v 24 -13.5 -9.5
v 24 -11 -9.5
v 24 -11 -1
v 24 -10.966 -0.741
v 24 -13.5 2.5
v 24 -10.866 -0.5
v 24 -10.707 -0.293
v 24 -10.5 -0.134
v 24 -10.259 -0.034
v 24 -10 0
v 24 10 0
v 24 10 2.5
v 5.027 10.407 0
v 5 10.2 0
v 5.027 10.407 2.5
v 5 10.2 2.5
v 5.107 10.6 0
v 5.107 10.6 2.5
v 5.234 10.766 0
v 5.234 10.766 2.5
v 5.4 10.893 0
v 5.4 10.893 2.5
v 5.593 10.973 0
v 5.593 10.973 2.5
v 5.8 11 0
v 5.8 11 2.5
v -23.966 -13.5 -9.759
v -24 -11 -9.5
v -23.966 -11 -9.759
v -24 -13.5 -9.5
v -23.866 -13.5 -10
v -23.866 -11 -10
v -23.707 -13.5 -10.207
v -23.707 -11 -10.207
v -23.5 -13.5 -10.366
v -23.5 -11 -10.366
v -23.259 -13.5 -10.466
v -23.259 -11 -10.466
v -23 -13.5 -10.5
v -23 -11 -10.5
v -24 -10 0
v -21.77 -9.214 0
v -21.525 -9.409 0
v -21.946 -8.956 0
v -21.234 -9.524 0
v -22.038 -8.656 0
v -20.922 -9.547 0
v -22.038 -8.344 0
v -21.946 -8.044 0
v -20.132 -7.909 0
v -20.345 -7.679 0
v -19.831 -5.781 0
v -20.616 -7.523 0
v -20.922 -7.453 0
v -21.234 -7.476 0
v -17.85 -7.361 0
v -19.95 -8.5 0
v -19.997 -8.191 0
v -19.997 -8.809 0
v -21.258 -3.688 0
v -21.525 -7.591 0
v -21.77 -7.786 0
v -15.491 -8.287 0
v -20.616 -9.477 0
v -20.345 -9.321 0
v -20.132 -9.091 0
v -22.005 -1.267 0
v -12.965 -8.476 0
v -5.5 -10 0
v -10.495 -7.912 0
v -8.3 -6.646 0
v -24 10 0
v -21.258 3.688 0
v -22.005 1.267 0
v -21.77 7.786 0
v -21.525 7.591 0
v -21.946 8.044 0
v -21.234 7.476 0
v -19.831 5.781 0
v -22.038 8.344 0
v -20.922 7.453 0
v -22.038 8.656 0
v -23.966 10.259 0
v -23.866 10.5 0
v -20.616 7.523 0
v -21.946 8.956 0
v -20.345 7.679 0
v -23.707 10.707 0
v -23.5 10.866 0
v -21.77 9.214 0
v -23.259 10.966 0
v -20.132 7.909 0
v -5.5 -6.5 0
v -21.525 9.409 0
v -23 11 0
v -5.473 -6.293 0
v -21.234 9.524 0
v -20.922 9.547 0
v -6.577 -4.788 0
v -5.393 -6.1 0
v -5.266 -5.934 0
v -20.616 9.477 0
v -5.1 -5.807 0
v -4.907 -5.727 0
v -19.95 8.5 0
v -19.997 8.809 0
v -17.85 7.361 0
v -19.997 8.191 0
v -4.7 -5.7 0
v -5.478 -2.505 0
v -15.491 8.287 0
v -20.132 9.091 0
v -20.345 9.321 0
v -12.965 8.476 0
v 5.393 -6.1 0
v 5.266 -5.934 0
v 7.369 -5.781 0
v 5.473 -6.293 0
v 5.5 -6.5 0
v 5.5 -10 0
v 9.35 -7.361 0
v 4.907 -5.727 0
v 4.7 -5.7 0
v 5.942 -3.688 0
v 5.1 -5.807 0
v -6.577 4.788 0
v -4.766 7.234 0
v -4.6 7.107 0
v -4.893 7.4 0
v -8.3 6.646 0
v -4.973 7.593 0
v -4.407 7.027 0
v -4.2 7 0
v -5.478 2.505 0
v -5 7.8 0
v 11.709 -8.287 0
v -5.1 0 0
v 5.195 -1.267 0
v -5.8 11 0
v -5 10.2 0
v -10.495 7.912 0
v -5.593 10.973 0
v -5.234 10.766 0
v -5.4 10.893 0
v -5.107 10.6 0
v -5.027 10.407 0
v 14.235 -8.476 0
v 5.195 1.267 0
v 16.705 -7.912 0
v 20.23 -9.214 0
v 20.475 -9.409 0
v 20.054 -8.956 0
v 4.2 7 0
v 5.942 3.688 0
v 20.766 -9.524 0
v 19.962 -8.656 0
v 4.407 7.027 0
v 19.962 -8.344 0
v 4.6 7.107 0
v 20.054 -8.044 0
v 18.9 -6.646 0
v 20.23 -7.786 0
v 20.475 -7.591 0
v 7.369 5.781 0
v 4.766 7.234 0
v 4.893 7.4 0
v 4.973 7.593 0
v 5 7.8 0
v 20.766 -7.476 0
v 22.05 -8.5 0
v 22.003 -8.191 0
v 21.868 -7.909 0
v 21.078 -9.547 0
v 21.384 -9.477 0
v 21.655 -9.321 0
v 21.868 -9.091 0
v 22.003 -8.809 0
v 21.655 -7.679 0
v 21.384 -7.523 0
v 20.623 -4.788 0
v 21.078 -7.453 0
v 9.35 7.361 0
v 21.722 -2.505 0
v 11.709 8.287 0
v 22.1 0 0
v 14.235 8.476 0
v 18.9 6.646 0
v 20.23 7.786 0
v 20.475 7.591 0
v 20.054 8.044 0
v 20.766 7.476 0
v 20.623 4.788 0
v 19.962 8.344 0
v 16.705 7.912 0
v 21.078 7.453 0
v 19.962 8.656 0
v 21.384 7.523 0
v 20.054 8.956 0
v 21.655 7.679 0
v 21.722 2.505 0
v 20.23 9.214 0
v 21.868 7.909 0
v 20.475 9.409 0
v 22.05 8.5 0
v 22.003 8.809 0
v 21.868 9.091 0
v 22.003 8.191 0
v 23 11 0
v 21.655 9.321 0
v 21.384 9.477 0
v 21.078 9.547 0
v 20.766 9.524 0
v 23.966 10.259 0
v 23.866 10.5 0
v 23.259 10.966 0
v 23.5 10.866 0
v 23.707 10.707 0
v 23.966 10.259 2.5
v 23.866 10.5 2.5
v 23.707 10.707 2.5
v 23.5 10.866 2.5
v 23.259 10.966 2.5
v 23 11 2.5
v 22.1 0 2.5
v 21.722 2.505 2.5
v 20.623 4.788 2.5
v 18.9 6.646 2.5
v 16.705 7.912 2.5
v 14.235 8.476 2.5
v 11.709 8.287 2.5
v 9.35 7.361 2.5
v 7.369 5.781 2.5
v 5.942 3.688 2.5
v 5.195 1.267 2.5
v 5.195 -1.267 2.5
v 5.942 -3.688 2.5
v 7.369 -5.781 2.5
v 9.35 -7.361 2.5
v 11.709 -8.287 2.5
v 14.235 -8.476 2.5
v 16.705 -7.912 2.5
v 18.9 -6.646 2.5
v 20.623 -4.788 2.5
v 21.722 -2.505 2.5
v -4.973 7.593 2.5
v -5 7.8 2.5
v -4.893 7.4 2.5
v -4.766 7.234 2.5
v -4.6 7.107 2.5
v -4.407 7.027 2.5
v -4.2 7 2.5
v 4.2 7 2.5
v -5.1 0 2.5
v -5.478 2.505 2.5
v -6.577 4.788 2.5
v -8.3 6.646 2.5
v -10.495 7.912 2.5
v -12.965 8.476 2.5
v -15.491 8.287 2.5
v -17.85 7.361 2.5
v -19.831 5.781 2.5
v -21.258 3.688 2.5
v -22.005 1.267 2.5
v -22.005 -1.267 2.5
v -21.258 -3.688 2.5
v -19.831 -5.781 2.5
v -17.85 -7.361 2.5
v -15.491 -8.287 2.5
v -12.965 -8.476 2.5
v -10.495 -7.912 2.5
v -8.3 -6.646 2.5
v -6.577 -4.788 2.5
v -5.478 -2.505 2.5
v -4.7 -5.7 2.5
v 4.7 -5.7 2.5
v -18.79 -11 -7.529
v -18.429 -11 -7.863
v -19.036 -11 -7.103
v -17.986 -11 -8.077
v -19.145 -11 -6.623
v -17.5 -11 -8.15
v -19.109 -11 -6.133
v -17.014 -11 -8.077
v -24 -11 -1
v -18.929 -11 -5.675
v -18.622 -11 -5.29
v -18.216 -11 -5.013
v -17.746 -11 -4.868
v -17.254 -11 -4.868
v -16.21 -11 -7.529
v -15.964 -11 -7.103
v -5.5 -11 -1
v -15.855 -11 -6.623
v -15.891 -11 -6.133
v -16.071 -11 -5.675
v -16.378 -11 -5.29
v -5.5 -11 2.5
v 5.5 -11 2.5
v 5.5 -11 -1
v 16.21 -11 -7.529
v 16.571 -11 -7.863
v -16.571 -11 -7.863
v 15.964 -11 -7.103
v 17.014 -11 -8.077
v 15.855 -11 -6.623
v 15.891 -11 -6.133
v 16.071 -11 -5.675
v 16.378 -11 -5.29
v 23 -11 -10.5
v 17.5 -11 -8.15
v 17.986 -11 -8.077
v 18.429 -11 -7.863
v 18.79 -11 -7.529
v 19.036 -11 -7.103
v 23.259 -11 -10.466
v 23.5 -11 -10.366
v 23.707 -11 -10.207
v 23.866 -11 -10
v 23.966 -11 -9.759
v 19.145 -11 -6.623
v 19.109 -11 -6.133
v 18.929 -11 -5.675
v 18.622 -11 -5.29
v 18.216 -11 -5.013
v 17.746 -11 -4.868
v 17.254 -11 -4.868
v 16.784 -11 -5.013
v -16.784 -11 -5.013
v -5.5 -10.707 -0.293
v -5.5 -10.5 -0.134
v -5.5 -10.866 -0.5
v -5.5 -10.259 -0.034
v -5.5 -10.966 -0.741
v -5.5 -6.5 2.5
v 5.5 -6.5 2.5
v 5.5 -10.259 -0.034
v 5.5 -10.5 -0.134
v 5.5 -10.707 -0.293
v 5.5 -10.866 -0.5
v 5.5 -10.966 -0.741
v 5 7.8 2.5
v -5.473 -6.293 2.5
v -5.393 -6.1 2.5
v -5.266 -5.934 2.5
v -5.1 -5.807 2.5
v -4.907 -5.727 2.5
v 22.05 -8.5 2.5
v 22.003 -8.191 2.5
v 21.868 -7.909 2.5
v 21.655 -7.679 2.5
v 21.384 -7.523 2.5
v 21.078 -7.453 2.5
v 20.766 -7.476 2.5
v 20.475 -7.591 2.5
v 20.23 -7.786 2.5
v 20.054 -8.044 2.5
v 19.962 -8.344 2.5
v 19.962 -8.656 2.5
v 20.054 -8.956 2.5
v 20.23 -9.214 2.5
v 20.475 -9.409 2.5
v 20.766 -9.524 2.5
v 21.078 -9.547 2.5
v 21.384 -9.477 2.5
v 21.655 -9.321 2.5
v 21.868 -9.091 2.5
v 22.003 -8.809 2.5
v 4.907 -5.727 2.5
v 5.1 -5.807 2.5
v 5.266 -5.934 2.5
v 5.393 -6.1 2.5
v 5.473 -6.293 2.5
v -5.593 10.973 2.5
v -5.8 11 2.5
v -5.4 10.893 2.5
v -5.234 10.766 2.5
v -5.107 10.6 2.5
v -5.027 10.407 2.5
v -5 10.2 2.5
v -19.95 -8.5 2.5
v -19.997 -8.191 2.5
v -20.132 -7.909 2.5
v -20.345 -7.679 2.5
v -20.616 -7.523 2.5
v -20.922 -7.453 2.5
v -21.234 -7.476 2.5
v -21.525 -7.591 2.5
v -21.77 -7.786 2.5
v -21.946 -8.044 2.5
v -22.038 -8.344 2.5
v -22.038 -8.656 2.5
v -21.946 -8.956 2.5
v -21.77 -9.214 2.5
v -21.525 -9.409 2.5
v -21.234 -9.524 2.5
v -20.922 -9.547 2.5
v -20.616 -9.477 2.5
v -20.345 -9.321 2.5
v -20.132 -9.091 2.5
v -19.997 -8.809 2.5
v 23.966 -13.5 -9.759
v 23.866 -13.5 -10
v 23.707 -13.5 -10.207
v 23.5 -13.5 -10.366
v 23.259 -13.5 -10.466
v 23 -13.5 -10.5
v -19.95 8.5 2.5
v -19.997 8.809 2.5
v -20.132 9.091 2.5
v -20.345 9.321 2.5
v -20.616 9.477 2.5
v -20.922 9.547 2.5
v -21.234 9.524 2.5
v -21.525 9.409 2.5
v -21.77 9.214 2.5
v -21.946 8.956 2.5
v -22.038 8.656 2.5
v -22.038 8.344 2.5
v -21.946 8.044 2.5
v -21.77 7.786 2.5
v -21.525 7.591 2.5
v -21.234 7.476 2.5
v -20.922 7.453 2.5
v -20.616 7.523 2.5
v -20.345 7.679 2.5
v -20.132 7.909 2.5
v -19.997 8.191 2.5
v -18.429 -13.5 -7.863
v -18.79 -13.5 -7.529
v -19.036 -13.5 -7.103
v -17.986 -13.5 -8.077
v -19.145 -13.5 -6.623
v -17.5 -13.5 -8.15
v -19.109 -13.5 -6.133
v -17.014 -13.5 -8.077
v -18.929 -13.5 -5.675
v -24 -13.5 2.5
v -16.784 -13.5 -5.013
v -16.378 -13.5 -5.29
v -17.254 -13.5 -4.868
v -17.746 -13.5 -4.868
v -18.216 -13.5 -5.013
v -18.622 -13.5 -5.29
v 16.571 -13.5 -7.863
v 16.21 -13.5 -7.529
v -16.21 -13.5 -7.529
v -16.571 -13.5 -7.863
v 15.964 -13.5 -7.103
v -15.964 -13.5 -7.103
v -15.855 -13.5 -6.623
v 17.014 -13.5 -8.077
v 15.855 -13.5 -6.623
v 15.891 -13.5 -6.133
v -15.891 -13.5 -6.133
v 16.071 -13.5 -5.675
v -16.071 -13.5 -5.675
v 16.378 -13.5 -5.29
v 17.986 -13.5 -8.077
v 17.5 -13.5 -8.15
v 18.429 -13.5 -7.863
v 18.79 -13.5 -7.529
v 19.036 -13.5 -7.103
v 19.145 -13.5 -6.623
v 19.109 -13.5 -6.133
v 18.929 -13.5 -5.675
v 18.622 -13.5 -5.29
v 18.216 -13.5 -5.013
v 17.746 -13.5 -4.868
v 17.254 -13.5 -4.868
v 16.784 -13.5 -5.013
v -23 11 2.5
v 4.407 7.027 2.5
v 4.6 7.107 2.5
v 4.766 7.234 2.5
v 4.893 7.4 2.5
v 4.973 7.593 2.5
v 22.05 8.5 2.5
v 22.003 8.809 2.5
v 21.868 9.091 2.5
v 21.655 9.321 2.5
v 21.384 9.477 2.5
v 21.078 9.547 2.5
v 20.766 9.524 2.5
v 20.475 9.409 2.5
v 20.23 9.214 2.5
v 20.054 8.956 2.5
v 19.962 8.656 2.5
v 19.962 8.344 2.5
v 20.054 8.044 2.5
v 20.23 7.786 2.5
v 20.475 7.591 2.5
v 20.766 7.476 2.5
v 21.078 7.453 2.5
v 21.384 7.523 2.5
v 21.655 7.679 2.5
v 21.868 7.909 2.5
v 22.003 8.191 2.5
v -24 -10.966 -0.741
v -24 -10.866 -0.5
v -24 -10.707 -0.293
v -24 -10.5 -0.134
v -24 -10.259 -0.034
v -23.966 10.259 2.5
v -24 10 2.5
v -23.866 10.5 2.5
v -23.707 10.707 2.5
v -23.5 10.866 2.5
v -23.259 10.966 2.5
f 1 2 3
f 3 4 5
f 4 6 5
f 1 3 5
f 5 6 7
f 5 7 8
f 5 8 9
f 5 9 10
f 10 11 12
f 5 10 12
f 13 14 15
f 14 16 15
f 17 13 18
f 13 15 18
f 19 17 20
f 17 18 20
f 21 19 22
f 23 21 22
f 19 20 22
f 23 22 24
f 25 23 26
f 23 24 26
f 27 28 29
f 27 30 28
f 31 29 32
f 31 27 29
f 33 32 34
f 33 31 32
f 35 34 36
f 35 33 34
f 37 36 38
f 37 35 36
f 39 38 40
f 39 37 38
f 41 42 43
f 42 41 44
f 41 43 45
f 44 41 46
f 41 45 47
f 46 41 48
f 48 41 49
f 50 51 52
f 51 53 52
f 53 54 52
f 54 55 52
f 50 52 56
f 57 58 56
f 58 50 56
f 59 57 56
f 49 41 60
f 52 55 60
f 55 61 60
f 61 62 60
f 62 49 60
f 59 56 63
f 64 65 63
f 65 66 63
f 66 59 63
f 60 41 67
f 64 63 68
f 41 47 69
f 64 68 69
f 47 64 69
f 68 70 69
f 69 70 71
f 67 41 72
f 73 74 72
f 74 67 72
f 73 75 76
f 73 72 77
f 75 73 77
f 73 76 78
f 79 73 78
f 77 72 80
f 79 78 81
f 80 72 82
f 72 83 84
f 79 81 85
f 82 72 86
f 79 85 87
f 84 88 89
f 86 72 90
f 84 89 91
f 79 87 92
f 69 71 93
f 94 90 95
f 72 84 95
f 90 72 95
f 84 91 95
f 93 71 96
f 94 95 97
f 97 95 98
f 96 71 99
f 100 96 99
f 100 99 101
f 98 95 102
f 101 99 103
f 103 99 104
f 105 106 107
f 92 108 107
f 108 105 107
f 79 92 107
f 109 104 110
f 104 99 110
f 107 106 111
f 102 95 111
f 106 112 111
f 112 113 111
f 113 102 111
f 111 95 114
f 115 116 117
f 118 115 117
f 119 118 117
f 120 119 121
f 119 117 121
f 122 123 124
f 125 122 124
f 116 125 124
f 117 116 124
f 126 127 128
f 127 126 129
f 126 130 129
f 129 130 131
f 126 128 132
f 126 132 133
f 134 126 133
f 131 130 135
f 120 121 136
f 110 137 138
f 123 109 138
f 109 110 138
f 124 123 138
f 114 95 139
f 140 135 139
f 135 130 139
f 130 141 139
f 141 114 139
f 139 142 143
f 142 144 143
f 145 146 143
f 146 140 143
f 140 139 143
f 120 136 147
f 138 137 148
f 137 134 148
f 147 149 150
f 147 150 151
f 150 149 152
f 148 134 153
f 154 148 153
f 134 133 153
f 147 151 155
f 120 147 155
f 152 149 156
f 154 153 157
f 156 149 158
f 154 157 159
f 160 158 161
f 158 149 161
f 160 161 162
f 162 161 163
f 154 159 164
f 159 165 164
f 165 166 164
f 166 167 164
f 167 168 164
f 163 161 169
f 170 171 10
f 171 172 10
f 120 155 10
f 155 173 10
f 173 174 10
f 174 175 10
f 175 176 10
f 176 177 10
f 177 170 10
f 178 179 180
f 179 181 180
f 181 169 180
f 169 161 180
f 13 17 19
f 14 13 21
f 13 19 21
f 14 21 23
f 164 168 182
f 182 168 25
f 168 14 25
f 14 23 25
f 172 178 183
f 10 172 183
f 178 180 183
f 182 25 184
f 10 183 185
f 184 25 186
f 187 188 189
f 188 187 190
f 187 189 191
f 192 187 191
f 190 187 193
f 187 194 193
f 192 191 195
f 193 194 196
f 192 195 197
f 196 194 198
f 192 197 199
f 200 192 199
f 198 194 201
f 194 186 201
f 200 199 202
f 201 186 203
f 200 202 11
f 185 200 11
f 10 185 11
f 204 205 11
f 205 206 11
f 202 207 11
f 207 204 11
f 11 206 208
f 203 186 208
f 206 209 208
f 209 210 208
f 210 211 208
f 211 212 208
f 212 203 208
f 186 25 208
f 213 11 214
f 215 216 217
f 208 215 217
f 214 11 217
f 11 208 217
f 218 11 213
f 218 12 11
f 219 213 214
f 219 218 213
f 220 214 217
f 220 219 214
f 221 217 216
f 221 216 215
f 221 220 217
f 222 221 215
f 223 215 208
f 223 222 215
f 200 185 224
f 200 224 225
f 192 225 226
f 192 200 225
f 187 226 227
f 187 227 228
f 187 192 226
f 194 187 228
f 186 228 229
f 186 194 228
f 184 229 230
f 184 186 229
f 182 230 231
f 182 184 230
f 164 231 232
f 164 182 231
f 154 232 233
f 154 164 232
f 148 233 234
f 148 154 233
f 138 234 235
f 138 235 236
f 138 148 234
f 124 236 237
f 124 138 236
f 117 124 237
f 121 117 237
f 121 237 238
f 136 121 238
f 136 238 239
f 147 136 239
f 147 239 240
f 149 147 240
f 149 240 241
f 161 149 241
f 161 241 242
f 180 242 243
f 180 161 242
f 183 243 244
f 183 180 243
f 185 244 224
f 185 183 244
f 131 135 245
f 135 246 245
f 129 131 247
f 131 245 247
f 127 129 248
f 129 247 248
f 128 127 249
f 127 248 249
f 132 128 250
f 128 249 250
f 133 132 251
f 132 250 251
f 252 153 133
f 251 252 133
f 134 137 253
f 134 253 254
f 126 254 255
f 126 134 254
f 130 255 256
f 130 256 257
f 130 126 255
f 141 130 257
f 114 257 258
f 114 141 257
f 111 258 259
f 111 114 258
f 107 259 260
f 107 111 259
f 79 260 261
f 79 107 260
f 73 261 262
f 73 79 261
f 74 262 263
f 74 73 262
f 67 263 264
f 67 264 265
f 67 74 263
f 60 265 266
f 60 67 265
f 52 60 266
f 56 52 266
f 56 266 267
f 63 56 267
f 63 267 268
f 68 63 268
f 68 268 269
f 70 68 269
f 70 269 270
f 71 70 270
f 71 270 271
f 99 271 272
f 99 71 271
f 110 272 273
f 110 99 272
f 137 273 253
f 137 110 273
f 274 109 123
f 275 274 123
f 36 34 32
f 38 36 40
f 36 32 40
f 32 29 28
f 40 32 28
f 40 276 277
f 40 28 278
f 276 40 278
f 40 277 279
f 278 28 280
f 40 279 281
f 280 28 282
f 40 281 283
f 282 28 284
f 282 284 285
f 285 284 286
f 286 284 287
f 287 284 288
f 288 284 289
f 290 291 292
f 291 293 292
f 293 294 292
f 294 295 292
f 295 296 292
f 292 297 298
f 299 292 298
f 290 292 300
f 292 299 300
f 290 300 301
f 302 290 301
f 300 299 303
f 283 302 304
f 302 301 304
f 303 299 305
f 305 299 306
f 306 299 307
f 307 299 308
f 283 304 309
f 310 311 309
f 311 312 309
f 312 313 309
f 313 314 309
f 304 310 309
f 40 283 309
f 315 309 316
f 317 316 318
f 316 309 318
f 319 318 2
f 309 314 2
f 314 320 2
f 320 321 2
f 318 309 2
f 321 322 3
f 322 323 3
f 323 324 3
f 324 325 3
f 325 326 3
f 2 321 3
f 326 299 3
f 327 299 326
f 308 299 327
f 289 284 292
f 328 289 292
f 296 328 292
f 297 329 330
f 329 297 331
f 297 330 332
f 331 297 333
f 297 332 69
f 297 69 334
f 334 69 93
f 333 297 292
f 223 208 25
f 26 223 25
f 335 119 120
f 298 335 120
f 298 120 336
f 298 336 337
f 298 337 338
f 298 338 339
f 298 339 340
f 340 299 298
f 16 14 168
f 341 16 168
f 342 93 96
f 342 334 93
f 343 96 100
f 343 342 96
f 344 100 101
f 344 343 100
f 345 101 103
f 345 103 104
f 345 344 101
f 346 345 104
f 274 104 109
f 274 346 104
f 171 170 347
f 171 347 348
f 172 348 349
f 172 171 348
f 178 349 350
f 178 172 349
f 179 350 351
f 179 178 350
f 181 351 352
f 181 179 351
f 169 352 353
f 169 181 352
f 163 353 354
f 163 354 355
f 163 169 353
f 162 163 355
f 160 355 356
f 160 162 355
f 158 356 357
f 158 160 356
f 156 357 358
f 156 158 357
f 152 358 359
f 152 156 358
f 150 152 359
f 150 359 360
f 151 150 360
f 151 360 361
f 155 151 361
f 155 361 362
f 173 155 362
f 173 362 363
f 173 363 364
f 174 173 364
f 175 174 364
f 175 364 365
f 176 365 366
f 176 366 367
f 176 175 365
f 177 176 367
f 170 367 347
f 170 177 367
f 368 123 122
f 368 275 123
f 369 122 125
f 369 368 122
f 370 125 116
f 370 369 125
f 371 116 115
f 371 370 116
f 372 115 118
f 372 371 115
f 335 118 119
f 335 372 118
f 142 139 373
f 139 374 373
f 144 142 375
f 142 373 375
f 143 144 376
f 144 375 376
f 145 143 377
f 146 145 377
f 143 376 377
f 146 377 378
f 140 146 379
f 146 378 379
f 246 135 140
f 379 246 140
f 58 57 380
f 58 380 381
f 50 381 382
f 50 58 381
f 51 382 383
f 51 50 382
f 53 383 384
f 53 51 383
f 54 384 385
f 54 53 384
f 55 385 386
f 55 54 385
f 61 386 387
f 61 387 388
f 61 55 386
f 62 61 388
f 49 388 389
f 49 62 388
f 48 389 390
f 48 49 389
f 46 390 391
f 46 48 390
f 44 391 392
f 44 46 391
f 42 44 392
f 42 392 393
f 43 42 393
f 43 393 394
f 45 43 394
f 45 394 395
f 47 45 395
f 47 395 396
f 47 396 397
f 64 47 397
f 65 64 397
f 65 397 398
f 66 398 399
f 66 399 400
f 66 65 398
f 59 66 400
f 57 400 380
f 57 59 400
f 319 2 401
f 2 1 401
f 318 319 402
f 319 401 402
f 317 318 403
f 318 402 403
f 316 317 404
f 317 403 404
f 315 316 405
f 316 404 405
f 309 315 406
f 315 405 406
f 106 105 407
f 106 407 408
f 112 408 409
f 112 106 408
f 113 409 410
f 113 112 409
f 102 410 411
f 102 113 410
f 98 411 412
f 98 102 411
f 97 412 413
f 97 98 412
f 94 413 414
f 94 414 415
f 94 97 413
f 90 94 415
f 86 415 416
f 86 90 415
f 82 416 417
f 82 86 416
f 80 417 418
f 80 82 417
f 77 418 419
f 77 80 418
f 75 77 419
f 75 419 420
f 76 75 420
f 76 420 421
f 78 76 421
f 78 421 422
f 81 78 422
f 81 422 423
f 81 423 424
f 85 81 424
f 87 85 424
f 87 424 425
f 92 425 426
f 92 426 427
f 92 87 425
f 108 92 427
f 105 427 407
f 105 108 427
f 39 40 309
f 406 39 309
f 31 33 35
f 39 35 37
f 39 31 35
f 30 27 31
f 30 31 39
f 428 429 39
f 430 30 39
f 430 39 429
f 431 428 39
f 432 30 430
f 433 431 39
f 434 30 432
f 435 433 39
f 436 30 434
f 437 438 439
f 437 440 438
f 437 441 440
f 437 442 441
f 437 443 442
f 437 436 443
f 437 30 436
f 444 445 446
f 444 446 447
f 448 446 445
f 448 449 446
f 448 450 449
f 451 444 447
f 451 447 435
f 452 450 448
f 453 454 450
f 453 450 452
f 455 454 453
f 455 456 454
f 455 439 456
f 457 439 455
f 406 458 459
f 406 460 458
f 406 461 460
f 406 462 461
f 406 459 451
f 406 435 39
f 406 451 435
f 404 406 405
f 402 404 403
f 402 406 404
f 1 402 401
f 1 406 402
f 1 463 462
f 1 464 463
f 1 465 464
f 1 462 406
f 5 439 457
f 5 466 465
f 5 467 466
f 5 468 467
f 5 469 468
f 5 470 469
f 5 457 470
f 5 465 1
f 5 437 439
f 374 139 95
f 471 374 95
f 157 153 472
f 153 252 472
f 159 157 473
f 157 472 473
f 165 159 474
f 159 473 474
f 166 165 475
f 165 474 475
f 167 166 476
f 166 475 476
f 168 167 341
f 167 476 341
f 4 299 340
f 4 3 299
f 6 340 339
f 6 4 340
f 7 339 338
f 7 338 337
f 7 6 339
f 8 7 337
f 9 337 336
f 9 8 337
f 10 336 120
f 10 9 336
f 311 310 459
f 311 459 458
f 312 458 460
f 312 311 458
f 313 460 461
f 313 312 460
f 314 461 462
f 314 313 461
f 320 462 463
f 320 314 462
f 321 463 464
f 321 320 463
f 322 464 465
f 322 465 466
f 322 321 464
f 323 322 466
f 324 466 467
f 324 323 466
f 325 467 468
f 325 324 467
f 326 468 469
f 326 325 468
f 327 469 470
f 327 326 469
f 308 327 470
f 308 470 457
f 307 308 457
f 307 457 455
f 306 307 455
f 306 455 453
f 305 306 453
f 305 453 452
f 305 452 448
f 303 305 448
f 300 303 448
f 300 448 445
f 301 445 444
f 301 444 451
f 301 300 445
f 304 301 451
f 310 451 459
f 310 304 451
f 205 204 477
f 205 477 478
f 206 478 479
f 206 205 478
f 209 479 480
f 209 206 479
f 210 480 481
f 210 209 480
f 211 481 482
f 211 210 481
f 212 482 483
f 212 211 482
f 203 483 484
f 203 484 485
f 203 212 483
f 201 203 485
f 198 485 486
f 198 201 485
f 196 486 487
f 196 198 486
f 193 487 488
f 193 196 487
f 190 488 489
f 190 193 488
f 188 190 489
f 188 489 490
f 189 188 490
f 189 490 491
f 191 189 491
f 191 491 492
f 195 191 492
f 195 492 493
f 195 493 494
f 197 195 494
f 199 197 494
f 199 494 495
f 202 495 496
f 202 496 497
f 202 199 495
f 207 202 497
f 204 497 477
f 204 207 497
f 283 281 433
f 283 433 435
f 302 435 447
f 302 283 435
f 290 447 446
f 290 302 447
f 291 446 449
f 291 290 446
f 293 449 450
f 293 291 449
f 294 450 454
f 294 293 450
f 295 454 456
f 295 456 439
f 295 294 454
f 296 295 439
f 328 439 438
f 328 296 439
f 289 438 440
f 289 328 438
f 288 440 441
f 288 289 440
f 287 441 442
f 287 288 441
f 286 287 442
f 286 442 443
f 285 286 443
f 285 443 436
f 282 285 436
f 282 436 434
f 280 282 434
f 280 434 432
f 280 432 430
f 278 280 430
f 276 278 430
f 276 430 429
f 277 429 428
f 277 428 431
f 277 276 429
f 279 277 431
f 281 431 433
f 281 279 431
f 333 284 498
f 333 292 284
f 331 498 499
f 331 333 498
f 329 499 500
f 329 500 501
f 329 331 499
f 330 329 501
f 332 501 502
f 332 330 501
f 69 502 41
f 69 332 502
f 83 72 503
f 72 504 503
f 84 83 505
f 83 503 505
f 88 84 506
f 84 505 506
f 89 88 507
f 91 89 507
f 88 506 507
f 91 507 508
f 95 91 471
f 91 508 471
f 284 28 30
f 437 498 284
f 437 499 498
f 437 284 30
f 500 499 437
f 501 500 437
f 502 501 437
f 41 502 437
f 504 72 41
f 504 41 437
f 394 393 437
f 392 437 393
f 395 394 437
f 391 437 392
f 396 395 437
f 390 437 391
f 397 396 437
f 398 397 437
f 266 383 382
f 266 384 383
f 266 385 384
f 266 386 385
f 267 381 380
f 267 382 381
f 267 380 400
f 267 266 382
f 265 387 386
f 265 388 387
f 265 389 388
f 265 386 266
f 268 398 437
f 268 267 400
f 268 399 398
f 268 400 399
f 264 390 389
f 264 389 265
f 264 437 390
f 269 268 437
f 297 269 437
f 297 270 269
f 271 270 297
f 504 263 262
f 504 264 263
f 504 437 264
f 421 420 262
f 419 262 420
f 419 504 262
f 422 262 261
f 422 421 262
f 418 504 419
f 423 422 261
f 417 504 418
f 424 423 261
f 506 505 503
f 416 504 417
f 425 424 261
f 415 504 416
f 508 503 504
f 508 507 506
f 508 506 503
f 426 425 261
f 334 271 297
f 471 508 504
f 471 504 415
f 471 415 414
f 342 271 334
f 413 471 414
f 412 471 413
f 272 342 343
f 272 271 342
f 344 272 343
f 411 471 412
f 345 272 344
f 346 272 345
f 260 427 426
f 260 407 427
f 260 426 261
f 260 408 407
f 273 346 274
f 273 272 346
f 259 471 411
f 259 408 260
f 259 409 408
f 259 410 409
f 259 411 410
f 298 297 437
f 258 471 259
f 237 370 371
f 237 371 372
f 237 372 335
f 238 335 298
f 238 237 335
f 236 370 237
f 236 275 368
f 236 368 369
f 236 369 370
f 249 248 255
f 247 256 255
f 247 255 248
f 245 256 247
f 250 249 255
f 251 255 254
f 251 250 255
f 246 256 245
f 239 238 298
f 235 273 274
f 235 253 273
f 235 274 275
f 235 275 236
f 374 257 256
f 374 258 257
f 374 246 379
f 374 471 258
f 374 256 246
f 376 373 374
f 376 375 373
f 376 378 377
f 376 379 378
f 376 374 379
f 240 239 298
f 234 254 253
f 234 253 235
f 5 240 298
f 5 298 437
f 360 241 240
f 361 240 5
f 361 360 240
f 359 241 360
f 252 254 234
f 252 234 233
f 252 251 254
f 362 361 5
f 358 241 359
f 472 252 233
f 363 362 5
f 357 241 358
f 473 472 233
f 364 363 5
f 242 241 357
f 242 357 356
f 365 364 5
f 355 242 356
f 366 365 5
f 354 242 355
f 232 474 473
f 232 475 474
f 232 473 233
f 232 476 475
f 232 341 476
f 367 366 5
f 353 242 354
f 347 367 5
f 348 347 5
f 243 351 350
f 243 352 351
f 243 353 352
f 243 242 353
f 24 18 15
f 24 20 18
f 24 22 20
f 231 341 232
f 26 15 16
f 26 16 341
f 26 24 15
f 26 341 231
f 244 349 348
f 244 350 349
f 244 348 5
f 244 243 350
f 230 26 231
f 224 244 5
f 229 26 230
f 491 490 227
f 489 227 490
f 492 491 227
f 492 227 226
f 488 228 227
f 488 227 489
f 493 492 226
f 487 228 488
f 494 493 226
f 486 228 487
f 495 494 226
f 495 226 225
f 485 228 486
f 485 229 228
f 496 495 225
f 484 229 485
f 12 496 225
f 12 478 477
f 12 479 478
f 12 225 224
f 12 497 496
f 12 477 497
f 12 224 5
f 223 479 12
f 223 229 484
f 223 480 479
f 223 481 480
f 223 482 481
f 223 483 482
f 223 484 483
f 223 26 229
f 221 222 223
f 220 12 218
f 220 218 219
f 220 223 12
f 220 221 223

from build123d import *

# Parameters (mm, degrees)
SKETCH_1_R      = 1.05
SKETCH_1_R_2    = 8.5
EXTRUDE_1_DEPTH = 2.5
FILLET_1_R      = 0.8
SKETCH_2_W      = 48
SKETCH_2_H      = 13
SKETCH_2_R      = 1.65
EXTRUDE_2_DEPTH = 2.5
FILLET_2_R      = 1
FILLET_3_R      = 1


with BuildPart() as part:
    # 草图1 → 凸台-拉伸1 (new body)
    with BuildSketch(Plane.XY):
        Polygon((-24, 11), (-24, -11), (-5.5, -11), (-5.5, -5.7), (5.5, -5.7), (5.5, -11), (24, -11), (24, 11), (5, 11), (5, 7), (-5, 7), (-5, 11), align=None)
        with Locations((-21, -8.5)):
            Circle(SKETCH_1_R, mode=Mode.SUBTRACT)
        with Locations((21, -8.5)):
            Circle(SKETCH_1_R, mode=Mode.SUBTRACT)
        with Locations((-13.6, 0)):
            Circle(SKETCH_1_R_2, mode=Mode.SUBTRACT)
        with Locations((-21, 8.5)):
            Circle(SKETCH_1_R, mode=Mode.SUBTRACT)
        with Locations((13.6, 0)):
            Circle(SKETCH_1_R_2, mode=Mode.SUBTRACT)
        with Locations((21, 8.5)):
            Circle(SKETCH_1_R, mode=Mode.SUBTRACT)
    extrude(amount=EXTRUDE_1_DEPTH)

    # 圆角1
    fillet_1_edges = [part.edges().sort_by_distance(p)[0] for p in [
        (5, 11, 1.25),
        (5.5, -5.7, 1.25),
        (-5.5, -5.7, 1.25),
        (-5, 11, 1.25),
        (-5, 7, 1.25),
        (5, 7, 1.25),
    ]]
    fillet(fillet_1_edges, radius=FILLET_1_R)

    # 草图2 → 凸台-拉伸2 (add)
    with BuildSketch(Plane.XZ.offset(11)):
        with Locations((0, -4)):
            Rectangle(SKETCH_2_W, SKETCH_2_H)
        with Locations(Location((-17.5, -6.5, 0), (0, 0, 270))):
            Circle(SKETCH_2_R, mode=Mode.SUBTRACT)
        with Locations(Location((17.5, -6.5, 0), (0, 0, 270))):
            Circle(SKETCH_2_R, mode=Mode.SUBTRACT)
    extrude(amount=EXTRUDE_2_DEPTH)

    # 圆角2
    fillet_2_edges = [part.edges().sort_by_distance(p)[0] for p in [
        (14.75, -11, 0),
        (-14.75, -11, 0),
    ]]
    fillet(fillet_2_edges, radius=FILLET_2_R)

    # 圆角3
    fillet_3_edges = [part.edges().sort_by_distance(p)[0] for p in [
        (24, 11, 1.25),
        (-24, 11, 1.25),
        (-24, -12.25, -10.5),
        (24, -12.25, -10.5),
    ]]
    fillet(fillet_3_edges, radius=FILLET_3_R)


solid = part.part
